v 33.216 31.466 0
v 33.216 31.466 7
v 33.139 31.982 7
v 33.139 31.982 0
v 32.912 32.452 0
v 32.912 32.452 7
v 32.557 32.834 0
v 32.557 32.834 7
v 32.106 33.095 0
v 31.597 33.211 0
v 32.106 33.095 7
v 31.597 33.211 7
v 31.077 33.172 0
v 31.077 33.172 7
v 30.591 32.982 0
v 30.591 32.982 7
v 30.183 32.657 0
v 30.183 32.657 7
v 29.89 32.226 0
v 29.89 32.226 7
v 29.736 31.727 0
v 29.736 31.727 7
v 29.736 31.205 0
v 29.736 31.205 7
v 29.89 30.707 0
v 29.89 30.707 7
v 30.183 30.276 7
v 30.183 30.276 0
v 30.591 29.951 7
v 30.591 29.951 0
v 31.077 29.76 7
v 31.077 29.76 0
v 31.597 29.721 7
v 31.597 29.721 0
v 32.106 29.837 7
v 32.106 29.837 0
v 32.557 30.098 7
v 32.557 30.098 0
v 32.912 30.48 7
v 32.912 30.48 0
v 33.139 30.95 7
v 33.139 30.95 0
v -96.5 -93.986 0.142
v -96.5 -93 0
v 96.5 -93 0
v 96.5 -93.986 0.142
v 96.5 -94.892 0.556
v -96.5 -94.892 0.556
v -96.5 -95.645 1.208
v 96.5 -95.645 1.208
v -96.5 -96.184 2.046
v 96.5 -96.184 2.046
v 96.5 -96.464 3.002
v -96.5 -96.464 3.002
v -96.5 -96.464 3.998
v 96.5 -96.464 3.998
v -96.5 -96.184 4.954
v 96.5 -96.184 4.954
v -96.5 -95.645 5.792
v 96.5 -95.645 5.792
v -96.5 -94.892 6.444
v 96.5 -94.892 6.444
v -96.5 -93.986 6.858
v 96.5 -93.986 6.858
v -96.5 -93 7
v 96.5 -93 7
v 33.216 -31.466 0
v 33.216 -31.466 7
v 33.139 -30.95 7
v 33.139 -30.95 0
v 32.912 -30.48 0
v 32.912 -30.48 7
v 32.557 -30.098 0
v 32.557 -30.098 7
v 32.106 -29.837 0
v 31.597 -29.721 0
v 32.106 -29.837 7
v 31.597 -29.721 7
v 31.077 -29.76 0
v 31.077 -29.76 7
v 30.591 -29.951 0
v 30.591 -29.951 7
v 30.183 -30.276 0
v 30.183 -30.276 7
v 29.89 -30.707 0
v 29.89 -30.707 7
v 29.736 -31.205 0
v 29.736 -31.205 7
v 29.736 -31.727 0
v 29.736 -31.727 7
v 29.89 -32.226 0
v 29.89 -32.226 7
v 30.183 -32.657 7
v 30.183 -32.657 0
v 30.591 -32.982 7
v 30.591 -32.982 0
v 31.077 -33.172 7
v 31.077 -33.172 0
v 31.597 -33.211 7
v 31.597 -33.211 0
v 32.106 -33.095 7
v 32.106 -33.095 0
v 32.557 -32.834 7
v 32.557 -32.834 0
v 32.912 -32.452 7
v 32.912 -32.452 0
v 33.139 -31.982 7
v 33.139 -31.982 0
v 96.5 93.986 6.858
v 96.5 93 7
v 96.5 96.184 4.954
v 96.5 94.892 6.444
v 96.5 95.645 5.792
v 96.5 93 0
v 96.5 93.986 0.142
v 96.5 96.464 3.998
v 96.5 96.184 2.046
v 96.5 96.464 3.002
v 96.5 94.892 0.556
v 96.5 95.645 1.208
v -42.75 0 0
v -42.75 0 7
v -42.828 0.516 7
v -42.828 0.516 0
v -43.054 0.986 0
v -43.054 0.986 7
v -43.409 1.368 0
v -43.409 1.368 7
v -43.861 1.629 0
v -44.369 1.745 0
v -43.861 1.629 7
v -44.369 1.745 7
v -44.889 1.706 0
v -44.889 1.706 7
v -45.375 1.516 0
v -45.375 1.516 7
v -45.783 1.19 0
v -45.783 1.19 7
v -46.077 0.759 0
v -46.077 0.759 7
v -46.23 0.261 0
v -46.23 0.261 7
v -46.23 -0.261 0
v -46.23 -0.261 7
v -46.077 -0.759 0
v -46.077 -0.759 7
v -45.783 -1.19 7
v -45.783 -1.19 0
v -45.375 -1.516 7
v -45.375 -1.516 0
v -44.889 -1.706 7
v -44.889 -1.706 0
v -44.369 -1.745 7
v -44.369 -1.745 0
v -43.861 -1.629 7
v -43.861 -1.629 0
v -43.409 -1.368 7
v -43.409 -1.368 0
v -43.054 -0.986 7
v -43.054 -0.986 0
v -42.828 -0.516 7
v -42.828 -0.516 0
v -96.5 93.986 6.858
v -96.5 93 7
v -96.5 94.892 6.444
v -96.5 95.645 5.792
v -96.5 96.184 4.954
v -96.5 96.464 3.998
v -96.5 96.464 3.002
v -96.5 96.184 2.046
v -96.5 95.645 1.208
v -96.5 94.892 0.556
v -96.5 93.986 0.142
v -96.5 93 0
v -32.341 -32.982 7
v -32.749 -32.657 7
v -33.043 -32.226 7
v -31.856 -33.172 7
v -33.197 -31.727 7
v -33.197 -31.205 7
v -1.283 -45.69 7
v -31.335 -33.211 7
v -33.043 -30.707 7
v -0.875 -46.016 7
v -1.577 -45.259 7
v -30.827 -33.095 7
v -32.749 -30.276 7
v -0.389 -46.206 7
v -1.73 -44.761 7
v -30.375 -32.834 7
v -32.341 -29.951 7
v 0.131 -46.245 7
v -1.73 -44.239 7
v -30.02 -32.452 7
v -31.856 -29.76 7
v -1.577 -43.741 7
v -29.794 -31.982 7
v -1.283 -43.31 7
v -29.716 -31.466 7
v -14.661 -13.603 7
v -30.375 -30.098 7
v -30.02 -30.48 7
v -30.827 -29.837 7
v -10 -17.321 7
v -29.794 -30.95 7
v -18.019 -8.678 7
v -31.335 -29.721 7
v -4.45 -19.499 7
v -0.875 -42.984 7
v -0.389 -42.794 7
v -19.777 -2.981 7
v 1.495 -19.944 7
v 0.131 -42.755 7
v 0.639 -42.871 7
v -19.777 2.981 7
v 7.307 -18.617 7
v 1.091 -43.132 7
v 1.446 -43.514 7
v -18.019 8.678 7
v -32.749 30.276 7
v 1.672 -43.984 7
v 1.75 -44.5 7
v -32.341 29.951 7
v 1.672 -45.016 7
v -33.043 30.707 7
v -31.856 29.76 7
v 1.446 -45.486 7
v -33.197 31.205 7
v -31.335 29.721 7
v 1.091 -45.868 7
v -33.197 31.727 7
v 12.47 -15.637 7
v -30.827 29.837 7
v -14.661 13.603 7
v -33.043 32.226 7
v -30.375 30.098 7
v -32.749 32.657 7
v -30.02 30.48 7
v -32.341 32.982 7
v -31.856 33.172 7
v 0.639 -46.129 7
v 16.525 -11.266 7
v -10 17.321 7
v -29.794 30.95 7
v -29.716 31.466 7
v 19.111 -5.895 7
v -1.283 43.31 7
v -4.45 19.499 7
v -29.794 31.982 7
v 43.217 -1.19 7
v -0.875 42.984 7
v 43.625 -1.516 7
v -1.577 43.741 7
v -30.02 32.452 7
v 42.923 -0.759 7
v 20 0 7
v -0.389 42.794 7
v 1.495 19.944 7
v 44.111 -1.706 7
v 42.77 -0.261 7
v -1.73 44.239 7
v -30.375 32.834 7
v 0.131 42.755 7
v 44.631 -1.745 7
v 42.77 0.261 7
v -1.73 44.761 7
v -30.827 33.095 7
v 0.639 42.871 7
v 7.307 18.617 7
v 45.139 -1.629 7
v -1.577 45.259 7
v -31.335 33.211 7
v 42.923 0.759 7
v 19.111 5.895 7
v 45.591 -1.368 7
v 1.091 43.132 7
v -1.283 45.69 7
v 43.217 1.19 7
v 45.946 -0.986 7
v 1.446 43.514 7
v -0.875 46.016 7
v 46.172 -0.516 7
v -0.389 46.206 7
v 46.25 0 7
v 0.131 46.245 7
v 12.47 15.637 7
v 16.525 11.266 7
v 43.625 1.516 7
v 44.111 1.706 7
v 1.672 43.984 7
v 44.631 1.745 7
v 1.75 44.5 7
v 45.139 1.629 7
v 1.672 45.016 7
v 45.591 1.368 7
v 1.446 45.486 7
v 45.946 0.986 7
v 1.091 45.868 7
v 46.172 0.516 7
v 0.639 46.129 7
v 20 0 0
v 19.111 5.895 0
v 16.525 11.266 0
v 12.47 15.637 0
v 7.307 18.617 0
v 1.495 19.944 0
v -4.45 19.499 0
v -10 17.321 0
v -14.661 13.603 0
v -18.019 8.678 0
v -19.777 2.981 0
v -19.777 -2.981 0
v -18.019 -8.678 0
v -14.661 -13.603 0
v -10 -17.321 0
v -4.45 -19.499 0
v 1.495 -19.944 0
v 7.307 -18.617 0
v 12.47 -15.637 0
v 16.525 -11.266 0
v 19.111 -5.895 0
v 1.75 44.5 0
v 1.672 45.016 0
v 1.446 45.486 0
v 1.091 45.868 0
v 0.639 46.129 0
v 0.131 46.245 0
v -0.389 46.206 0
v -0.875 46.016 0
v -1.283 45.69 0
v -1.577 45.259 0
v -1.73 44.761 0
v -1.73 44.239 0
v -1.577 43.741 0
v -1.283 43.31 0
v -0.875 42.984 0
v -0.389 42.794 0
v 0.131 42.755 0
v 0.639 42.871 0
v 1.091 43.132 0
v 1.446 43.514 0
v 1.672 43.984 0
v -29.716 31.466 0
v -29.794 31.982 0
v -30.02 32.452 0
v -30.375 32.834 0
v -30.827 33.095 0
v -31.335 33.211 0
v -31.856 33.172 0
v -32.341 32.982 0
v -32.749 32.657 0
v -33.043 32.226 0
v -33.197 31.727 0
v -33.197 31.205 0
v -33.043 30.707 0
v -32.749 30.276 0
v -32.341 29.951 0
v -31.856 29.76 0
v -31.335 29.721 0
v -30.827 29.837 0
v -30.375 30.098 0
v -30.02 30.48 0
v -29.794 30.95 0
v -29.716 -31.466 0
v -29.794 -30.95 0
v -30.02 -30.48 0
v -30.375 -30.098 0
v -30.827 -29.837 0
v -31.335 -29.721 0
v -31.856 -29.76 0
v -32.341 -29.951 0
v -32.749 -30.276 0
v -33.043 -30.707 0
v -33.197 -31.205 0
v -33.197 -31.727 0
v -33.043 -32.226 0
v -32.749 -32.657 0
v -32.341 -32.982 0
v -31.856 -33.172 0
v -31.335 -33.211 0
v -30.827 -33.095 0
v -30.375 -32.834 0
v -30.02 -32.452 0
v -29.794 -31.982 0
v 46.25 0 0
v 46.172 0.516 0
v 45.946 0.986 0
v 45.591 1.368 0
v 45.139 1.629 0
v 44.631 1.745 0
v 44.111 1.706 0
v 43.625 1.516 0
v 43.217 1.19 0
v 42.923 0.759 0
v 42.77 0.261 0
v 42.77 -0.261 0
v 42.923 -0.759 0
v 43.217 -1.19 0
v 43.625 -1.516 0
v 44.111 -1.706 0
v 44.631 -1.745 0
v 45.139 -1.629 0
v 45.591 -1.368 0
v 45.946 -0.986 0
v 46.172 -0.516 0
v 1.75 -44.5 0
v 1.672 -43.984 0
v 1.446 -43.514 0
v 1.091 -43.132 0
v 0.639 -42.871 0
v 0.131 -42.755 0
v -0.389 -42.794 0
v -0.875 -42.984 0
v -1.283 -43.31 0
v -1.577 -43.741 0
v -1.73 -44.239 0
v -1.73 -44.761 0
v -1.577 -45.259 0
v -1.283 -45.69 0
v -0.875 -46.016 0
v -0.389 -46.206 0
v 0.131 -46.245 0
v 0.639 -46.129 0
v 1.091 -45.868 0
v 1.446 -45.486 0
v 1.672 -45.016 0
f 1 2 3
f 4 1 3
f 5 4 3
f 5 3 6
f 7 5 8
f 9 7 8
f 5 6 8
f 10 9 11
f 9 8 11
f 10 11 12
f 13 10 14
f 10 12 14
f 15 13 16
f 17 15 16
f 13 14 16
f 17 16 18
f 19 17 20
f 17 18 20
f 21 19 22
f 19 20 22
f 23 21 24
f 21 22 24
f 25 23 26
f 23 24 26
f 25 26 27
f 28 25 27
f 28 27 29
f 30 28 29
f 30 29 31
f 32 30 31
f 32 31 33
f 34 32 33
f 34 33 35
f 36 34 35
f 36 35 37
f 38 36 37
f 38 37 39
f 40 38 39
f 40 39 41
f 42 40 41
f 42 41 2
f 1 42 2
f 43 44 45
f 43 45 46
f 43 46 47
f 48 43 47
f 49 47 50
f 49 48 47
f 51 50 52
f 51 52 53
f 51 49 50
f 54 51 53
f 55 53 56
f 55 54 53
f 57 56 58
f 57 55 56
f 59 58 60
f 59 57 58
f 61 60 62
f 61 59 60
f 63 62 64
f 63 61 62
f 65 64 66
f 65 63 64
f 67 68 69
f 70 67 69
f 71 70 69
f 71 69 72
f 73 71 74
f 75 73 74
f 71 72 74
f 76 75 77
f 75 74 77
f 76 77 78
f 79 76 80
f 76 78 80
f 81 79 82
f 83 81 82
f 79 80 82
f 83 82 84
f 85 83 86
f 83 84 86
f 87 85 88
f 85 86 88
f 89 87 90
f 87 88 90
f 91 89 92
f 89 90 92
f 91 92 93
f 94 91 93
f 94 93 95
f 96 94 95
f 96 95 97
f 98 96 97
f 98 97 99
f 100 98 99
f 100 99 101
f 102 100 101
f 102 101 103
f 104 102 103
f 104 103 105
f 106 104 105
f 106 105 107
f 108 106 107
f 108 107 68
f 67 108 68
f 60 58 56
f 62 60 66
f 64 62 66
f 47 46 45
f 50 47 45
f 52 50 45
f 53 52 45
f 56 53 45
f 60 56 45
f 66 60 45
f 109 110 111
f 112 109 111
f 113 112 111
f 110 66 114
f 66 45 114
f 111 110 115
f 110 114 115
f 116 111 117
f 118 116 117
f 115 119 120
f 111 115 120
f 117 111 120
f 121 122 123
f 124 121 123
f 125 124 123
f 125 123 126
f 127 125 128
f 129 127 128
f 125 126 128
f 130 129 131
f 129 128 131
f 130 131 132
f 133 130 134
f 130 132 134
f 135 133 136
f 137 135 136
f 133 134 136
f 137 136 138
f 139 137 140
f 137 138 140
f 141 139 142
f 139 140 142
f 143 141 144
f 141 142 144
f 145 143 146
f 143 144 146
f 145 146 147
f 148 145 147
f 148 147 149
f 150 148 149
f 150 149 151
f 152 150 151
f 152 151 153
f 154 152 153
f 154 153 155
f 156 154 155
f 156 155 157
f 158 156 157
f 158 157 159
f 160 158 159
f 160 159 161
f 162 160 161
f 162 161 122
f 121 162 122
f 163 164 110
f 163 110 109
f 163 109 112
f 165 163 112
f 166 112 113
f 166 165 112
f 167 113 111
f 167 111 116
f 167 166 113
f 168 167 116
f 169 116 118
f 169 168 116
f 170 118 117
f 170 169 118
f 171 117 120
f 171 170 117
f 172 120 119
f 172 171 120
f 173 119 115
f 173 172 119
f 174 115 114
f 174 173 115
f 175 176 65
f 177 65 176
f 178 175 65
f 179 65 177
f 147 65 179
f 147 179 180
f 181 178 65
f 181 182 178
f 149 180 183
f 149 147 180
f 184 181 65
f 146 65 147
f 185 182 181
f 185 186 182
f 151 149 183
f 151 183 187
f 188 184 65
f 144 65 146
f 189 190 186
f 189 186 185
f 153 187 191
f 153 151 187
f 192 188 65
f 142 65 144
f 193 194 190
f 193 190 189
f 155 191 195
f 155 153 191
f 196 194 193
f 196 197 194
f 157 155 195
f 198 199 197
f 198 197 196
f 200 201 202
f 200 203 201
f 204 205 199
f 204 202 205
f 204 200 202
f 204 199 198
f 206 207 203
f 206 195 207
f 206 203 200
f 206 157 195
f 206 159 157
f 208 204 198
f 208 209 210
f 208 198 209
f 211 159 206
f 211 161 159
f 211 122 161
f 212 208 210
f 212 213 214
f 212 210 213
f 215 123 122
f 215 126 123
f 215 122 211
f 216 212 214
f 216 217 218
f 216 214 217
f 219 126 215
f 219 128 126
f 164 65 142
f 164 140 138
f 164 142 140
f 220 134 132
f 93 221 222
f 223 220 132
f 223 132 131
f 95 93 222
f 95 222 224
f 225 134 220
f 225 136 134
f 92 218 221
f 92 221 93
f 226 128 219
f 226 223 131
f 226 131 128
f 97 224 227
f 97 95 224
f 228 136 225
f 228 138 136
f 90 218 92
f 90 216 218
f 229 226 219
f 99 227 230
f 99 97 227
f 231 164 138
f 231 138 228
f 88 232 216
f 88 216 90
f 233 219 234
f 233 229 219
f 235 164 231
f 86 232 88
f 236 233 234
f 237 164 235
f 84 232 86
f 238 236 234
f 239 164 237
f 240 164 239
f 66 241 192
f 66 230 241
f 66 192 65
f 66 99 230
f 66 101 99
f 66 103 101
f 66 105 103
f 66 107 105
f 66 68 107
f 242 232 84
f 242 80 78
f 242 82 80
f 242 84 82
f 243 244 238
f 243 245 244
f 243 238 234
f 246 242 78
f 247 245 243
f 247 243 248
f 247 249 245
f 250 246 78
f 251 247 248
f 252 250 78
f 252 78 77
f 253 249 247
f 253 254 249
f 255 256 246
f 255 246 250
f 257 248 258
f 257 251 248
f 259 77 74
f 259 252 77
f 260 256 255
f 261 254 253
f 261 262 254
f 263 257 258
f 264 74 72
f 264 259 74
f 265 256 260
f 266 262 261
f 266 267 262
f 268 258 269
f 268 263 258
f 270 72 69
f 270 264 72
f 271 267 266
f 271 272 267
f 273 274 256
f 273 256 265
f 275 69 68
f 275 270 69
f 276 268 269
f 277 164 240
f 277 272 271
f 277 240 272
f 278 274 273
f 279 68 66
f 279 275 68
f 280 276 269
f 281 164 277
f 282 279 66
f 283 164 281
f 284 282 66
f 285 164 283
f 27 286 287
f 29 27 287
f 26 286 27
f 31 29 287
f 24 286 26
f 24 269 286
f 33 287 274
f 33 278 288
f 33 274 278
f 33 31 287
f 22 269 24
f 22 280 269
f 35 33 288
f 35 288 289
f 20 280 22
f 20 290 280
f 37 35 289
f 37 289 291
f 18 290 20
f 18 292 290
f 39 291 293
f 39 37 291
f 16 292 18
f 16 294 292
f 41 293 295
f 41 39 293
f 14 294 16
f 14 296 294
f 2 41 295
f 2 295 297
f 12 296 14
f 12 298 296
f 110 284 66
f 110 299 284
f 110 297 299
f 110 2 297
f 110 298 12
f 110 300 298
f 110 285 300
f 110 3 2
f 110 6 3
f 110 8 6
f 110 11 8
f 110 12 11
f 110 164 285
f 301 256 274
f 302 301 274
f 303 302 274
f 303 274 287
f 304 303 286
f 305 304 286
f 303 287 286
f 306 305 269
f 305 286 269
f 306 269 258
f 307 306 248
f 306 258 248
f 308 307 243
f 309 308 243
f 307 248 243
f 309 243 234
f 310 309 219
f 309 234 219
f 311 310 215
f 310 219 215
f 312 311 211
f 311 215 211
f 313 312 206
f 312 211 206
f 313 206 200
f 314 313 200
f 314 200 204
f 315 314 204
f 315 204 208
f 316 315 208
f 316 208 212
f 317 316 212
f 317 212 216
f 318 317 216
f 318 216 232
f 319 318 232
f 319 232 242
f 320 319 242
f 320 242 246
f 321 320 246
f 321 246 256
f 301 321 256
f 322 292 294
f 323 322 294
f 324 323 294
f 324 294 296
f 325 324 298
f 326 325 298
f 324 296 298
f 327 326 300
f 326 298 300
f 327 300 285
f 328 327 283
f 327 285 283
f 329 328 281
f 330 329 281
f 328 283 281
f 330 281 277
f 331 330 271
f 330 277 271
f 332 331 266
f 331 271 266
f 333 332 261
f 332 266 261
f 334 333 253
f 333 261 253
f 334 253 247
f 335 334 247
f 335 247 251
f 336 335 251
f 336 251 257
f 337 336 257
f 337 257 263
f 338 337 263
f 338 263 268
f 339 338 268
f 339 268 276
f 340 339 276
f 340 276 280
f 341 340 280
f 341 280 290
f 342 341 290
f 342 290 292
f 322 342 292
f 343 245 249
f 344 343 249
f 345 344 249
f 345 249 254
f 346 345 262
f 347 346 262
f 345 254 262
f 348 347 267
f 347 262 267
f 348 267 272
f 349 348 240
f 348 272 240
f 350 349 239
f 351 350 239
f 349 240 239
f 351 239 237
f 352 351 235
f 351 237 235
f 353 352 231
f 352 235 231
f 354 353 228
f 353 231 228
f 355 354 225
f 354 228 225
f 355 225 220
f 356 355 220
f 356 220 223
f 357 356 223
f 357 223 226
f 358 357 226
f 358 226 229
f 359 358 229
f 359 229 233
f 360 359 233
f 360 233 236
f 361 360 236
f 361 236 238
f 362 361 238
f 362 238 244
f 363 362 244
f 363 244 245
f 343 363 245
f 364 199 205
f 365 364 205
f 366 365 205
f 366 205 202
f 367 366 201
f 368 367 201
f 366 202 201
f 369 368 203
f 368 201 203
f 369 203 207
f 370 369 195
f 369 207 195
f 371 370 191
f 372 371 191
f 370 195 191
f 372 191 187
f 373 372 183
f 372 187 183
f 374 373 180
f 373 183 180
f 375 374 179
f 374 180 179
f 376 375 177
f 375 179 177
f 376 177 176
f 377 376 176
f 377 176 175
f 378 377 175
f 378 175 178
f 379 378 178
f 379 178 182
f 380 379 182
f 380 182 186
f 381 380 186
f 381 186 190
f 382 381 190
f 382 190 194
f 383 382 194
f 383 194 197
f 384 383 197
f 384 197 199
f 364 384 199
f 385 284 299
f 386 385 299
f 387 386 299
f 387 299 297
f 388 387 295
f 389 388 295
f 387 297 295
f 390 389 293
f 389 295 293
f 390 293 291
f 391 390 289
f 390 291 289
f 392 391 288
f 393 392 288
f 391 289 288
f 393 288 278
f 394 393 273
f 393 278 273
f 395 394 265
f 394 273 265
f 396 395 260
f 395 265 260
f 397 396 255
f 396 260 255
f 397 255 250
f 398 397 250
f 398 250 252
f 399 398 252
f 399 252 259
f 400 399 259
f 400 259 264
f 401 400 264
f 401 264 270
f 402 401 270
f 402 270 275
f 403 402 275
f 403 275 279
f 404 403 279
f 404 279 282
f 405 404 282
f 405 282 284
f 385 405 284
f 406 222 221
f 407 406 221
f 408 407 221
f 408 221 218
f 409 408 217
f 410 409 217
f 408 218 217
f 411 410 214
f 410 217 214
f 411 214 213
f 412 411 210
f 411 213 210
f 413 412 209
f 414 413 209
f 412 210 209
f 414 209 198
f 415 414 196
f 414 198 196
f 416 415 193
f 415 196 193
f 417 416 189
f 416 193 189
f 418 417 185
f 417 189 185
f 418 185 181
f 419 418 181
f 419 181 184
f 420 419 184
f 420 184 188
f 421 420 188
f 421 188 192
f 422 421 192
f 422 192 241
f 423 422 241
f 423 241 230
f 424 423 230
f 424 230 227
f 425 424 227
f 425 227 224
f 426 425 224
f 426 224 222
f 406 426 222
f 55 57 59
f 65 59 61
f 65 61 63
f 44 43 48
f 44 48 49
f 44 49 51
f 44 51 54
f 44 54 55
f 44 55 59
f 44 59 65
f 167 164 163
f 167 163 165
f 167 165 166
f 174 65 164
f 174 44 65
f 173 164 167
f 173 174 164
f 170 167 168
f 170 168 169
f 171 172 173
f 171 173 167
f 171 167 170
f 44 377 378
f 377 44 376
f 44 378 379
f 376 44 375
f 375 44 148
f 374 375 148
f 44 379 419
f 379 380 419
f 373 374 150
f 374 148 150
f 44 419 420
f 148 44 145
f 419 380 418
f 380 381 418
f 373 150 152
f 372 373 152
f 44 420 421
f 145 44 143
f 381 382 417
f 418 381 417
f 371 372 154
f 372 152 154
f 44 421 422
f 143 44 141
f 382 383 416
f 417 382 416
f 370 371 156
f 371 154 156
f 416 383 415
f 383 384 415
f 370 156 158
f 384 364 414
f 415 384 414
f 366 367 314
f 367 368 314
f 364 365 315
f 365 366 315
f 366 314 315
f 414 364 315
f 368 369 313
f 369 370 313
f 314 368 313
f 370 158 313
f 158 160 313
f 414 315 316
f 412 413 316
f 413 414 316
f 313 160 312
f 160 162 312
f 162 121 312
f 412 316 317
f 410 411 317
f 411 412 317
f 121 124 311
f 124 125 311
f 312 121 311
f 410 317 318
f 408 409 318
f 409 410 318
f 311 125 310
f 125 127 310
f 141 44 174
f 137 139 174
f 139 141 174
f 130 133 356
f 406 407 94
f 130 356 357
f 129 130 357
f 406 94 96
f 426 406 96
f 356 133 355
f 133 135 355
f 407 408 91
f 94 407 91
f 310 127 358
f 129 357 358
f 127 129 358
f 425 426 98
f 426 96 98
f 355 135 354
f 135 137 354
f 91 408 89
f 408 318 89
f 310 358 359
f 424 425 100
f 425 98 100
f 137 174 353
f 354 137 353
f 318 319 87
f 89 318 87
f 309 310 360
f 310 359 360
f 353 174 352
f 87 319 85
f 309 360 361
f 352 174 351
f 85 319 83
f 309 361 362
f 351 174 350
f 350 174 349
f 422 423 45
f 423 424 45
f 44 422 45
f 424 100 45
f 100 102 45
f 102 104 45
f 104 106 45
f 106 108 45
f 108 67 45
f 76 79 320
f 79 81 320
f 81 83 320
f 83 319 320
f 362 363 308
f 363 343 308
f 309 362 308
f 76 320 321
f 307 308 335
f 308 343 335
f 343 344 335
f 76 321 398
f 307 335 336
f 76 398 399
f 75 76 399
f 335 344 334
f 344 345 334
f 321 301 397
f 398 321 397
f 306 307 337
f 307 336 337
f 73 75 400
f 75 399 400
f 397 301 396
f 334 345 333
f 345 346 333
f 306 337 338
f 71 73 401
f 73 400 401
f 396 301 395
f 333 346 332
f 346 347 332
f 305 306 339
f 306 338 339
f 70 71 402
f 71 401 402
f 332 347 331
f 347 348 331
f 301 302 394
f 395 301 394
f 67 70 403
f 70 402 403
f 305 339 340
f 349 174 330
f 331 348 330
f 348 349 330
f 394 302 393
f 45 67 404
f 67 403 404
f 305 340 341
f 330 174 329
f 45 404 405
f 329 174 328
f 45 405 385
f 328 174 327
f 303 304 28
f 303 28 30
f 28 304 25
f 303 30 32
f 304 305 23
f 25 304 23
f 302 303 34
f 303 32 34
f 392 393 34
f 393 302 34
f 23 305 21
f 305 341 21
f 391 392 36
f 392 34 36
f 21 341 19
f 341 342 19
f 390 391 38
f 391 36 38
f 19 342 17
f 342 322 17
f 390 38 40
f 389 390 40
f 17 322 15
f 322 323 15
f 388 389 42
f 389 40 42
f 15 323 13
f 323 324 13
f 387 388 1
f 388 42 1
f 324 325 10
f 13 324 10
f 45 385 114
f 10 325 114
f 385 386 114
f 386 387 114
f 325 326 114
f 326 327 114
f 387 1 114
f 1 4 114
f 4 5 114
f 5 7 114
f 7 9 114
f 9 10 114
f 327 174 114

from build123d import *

# Parameters (mm, degrees)
SKETCH_1_W          = 193
SKETCH_1_H          = 193
EXTRUDE_1_DEPTH     = 7
SKETCH_2_R          = 20
CUT_EXTRUDE_1_DEPTH = 123
SKETCH_3_R          = 1.75
CUT_EXTRUDE_2_DEPTH = 137.651015364
FILLET_2_RADIUS     = 3.5
FILLET_2_LENGTH     = 193
FILLET_4_RADIUS     = 3.5
FILLET_4_LENGTH     = 193


with BuildPart() as part:
    # 草图1 → 凸台-拉伸1 (new body)
    with BuildSketch(Plane.XY):
        Rectangle(SKETCH_1_W, SKETCH_1_H)
    extrude(amount=EXTRUDE_1_DEPTH)

    # 草图2 → 切除-拉伸1 (cut)
    with BuildSketch(Plane.XY.offset(7)):
        Circle(SKETCH_2_R)
    extrude(amount=-CUT_EXTRUDE_1_DEPTH, mode=Mode.SUBTRACT)

    # 草图3 → 切除-拉伸2 (cut, through all)
    with BuildSketch(Plane.XY.offset(7)):
        with Locations((0, 44.5)):
            Circle(SKETCH_3_R)
        with Locations((31.466251763, 31.466251763)):
            Circle(SKETCH_3_R)
        with Locations((44.5, 0)):
            Circle(SKETCH_3_R)
        with Locations((31.466251763, -31.466251763)):
            Circle(SKETCH_3_R)
        with Locations((0, -44.5)):
            Circle(SKETCH_3_R)
        with Locations((-31.466251763, -31.466251763)):
            Circle(SKETCH_3_R)
        with Locations((-44.5, 0)):
            Circle(SKETCH_3_R)
        with Locations((-31.466251763, 31.466251763)):
            Circle(SKETCH_3_R)
    extrude(amount=-CUT_EXTRUDE_2_DEPTH, mode=Mode.SUBTRACT)

    # 圆角2: full round fillet: the end face becomes a half cylinder, R = half its width
    fillet_2_face = Plane((0, 96.5, 3.5), x_dir=(-1, 0, 0), z_dir=(0, 1, 0))  # on the end face: x along it, z out of the body
    fillet_2_slab = fillet_2_face.offset(-FILLET_2_RADIUS / 2) * Box(FILLET_2_LENGTH, 2 * FILLET_2_RADIUS, FILLET_2_RADIUS, mode=Mode.PRIVATE)  # the body's end, R deep
    fillet_2_round = Plane((0, 93, 3.5), x_dir=(0, 1, 0), z_dir=(-1, 0, 0)) * Cylinder(FILLET_2_RADIUS, FILLET_2_LENGTH, mode=Mode.PRIVATE)  # its axis R under the face
    add(fillet_2_slab - fillet_2_round, mode=Mode.SUBTRACT)

    # 圆角4: full round fillet: the end face becomes a half cylinder, R = half its width
    fillet_4_face = Plane((0, -96.5, 3.5), x_dir=(-1, 0, 0), z_dir=(0, -1, 0))  # on the end face: x along it, z out of the body
    fillet_4_slab = fillet_4_face.offset(-FILLET_4_RADIUS / 2) * Box(FILLET_4_LENGTH, 2 * FILLET_4_RADIUS, FILLET_4_RADIUS, mode=Mode.PRIVATE)  # the body's end, R deep
    fillet_4_round = Plane((0, -93, 3.5), x_dir=(0, -1, 0), z_dir=(-1, 0, 0)) * Cylinder(FILLET_4_RADIUS, FILLET_4_LENGTH, mode=Mode.PRIVATE)  # its axis R under the face
    add(fillet_4_slab - fillet_4_round, mode=Mode.SUBTRACT)


solid = part.part
